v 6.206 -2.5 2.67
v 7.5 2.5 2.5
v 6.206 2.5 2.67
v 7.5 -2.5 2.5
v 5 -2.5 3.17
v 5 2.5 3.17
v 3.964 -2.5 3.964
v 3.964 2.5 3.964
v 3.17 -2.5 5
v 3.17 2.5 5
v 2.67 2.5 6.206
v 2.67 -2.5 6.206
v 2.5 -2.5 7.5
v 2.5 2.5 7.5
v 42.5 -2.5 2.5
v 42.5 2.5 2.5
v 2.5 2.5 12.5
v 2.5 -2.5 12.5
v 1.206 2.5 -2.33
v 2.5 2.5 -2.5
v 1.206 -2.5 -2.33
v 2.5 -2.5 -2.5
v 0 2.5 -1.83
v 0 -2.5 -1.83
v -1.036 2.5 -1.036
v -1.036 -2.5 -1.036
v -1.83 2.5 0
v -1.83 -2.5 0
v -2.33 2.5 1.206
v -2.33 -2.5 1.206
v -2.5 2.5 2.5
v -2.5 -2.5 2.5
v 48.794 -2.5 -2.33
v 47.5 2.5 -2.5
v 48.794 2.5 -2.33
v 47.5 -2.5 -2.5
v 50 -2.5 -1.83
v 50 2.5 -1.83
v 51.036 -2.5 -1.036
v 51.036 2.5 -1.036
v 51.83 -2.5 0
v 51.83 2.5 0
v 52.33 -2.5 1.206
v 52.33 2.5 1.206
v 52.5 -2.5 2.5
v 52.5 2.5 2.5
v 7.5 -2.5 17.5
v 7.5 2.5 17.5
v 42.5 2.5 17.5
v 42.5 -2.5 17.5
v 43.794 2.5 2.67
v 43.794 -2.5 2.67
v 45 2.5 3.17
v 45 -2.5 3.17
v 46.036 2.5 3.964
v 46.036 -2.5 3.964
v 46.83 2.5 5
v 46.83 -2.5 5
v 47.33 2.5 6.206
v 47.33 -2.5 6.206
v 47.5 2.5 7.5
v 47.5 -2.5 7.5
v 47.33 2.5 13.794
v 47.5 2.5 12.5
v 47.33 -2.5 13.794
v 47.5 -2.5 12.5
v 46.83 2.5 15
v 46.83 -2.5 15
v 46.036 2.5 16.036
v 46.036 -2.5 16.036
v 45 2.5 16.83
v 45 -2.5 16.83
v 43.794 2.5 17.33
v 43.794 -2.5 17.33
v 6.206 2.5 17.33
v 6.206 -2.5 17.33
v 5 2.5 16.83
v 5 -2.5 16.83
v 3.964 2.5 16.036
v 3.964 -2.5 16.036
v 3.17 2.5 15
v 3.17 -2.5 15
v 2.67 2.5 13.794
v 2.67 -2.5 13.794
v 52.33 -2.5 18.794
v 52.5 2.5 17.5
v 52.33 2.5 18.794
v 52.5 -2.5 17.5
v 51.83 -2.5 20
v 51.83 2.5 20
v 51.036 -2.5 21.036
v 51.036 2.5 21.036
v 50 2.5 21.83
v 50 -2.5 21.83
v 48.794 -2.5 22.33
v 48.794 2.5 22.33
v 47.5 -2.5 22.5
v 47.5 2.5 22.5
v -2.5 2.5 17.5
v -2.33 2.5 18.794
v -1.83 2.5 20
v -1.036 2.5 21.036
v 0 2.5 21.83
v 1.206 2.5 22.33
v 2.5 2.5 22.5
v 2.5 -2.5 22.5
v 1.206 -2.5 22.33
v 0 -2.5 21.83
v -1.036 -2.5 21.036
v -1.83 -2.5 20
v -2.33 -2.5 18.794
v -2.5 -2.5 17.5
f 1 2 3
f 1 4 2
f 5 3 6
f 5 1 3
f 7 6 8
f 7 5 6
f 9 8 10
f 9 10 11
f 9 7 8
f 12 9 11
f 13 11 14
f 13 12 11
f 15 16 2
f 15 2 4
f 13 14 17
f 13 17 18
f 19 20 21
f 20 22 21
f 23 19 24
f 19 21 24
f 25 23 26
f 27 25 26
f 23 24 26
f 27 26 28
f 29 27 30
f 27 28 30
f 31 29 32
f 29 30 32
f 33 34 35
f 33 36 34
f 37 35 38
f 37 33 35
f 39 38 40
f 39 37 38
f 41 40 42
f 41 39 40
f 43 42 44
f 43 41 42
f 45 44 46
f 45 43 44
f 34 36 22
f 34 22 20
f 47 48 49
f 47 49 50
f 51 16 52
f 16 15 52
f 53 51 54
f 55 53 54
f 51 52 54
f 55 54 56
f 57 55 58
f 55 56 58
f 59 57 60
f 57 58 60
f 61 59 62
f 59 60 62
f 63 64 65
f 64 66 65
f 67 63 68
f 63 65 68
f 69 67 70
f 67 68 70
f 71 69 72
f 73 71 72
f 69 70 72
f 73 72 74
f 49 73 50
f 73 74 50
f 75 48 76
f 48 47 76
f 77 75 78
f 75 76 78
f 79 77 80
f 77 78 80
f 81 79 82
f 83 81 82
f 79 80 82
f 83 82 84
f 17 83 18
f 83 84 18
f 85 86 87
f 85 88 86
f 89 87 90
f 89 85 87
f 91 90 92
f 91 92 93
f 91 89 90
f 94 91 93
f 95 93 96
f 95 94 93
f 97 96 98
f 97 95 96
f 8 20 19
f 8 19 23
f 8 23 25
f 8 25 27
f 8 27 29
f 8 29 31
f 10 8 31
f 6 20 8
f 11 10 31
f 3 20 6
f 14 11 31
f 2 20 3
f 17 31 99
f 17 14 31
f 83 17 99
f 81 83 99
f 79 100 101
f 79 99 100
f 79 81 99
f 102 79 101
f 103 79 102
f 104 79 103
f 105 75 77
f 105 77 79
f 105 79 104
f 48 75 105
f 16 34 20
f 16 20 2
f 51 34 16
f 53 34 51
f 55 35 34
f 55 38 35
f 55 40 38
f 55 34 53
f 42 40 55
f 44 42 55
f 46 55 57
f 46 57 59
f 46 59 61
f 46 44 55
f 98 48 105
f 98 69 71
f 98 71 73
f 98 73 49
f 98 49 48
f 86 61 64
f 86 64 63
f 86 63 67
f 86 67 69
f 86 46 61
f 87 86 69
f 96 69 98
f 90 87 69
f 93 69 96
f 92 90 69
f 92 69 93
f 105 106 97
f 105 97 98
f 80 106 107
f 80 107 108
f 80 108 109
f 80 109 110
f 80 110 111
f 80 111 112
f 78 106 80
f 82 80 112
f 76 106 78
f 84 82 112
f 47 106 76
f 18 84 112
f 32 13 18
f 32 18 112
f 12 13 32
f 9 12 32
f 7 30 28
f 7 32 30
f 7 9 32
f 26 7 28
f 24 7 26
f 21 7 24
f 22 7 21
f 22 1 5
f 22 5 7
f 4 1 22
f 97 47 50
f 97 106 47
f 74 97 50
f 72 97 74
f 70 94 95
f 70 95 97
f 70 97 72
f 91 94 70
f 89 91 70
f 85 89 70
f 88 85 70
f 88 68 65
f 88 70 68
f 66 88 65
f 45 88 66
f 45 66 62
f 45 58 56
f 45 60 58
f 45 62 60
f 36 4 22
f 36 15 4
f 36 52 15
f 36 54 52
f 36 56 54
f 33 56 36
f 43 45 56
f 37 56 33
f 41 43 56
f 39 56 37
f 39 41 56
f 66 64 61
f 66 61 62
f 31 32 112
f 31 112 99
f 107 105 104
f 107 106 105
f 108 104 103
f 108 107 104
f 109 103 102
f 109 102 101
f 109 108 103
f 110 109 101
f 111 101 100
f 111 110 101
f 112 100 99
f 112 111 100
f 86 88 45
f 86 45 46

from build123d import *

# Parameters (mm, degrees)
SKETCH3_W = 5
SKETCH3_H = 5
FILLET1_R = 5


with BuildPart() as part:
    # Sweep2: sweep along a path in Sketch4
    with BuildLine(Plane(origin=(0, 0, 0), x_dir=(1, 0, 0), z_dir=(0, 1, 0))) as sweep2_path:
        Line((0, 0), (50, 0))
        Line((50, 0), (50, -20))
        Line((50, -20), (0, -20))
        Line((0, -20), (0, 0))
    # Sketch3 → Sweep2 (sweep)
    with BuildSketch(Plane(origin=(0, 0, 0), x_dir=(0, 0, -1), z_dir=(1, 0, 0))):
        Rectangle(SKETCH3_W, SKETCH3_H)
    sweep(path=sweep2_path.line, transition=Transition.RIGHT)

    # Fillet1
    fillet1_edges = [part.edges().sort_by_distance(p)[0] for p in [
        (-2.5, 0, 22.5),
        (2.5, 0, 17.5),
        (47.5, 0, 2.5),
        (52.5, 0, -2.5),
        (-2.5, 0, -2.5),
        (2.5, 0, 2.5),
        (52.5, 0, 22.5),
        (47.5, 0, 17.5),
    ]]
    fillet(fillet1_edges, radius=FILLET1_R)


solid = part.part
